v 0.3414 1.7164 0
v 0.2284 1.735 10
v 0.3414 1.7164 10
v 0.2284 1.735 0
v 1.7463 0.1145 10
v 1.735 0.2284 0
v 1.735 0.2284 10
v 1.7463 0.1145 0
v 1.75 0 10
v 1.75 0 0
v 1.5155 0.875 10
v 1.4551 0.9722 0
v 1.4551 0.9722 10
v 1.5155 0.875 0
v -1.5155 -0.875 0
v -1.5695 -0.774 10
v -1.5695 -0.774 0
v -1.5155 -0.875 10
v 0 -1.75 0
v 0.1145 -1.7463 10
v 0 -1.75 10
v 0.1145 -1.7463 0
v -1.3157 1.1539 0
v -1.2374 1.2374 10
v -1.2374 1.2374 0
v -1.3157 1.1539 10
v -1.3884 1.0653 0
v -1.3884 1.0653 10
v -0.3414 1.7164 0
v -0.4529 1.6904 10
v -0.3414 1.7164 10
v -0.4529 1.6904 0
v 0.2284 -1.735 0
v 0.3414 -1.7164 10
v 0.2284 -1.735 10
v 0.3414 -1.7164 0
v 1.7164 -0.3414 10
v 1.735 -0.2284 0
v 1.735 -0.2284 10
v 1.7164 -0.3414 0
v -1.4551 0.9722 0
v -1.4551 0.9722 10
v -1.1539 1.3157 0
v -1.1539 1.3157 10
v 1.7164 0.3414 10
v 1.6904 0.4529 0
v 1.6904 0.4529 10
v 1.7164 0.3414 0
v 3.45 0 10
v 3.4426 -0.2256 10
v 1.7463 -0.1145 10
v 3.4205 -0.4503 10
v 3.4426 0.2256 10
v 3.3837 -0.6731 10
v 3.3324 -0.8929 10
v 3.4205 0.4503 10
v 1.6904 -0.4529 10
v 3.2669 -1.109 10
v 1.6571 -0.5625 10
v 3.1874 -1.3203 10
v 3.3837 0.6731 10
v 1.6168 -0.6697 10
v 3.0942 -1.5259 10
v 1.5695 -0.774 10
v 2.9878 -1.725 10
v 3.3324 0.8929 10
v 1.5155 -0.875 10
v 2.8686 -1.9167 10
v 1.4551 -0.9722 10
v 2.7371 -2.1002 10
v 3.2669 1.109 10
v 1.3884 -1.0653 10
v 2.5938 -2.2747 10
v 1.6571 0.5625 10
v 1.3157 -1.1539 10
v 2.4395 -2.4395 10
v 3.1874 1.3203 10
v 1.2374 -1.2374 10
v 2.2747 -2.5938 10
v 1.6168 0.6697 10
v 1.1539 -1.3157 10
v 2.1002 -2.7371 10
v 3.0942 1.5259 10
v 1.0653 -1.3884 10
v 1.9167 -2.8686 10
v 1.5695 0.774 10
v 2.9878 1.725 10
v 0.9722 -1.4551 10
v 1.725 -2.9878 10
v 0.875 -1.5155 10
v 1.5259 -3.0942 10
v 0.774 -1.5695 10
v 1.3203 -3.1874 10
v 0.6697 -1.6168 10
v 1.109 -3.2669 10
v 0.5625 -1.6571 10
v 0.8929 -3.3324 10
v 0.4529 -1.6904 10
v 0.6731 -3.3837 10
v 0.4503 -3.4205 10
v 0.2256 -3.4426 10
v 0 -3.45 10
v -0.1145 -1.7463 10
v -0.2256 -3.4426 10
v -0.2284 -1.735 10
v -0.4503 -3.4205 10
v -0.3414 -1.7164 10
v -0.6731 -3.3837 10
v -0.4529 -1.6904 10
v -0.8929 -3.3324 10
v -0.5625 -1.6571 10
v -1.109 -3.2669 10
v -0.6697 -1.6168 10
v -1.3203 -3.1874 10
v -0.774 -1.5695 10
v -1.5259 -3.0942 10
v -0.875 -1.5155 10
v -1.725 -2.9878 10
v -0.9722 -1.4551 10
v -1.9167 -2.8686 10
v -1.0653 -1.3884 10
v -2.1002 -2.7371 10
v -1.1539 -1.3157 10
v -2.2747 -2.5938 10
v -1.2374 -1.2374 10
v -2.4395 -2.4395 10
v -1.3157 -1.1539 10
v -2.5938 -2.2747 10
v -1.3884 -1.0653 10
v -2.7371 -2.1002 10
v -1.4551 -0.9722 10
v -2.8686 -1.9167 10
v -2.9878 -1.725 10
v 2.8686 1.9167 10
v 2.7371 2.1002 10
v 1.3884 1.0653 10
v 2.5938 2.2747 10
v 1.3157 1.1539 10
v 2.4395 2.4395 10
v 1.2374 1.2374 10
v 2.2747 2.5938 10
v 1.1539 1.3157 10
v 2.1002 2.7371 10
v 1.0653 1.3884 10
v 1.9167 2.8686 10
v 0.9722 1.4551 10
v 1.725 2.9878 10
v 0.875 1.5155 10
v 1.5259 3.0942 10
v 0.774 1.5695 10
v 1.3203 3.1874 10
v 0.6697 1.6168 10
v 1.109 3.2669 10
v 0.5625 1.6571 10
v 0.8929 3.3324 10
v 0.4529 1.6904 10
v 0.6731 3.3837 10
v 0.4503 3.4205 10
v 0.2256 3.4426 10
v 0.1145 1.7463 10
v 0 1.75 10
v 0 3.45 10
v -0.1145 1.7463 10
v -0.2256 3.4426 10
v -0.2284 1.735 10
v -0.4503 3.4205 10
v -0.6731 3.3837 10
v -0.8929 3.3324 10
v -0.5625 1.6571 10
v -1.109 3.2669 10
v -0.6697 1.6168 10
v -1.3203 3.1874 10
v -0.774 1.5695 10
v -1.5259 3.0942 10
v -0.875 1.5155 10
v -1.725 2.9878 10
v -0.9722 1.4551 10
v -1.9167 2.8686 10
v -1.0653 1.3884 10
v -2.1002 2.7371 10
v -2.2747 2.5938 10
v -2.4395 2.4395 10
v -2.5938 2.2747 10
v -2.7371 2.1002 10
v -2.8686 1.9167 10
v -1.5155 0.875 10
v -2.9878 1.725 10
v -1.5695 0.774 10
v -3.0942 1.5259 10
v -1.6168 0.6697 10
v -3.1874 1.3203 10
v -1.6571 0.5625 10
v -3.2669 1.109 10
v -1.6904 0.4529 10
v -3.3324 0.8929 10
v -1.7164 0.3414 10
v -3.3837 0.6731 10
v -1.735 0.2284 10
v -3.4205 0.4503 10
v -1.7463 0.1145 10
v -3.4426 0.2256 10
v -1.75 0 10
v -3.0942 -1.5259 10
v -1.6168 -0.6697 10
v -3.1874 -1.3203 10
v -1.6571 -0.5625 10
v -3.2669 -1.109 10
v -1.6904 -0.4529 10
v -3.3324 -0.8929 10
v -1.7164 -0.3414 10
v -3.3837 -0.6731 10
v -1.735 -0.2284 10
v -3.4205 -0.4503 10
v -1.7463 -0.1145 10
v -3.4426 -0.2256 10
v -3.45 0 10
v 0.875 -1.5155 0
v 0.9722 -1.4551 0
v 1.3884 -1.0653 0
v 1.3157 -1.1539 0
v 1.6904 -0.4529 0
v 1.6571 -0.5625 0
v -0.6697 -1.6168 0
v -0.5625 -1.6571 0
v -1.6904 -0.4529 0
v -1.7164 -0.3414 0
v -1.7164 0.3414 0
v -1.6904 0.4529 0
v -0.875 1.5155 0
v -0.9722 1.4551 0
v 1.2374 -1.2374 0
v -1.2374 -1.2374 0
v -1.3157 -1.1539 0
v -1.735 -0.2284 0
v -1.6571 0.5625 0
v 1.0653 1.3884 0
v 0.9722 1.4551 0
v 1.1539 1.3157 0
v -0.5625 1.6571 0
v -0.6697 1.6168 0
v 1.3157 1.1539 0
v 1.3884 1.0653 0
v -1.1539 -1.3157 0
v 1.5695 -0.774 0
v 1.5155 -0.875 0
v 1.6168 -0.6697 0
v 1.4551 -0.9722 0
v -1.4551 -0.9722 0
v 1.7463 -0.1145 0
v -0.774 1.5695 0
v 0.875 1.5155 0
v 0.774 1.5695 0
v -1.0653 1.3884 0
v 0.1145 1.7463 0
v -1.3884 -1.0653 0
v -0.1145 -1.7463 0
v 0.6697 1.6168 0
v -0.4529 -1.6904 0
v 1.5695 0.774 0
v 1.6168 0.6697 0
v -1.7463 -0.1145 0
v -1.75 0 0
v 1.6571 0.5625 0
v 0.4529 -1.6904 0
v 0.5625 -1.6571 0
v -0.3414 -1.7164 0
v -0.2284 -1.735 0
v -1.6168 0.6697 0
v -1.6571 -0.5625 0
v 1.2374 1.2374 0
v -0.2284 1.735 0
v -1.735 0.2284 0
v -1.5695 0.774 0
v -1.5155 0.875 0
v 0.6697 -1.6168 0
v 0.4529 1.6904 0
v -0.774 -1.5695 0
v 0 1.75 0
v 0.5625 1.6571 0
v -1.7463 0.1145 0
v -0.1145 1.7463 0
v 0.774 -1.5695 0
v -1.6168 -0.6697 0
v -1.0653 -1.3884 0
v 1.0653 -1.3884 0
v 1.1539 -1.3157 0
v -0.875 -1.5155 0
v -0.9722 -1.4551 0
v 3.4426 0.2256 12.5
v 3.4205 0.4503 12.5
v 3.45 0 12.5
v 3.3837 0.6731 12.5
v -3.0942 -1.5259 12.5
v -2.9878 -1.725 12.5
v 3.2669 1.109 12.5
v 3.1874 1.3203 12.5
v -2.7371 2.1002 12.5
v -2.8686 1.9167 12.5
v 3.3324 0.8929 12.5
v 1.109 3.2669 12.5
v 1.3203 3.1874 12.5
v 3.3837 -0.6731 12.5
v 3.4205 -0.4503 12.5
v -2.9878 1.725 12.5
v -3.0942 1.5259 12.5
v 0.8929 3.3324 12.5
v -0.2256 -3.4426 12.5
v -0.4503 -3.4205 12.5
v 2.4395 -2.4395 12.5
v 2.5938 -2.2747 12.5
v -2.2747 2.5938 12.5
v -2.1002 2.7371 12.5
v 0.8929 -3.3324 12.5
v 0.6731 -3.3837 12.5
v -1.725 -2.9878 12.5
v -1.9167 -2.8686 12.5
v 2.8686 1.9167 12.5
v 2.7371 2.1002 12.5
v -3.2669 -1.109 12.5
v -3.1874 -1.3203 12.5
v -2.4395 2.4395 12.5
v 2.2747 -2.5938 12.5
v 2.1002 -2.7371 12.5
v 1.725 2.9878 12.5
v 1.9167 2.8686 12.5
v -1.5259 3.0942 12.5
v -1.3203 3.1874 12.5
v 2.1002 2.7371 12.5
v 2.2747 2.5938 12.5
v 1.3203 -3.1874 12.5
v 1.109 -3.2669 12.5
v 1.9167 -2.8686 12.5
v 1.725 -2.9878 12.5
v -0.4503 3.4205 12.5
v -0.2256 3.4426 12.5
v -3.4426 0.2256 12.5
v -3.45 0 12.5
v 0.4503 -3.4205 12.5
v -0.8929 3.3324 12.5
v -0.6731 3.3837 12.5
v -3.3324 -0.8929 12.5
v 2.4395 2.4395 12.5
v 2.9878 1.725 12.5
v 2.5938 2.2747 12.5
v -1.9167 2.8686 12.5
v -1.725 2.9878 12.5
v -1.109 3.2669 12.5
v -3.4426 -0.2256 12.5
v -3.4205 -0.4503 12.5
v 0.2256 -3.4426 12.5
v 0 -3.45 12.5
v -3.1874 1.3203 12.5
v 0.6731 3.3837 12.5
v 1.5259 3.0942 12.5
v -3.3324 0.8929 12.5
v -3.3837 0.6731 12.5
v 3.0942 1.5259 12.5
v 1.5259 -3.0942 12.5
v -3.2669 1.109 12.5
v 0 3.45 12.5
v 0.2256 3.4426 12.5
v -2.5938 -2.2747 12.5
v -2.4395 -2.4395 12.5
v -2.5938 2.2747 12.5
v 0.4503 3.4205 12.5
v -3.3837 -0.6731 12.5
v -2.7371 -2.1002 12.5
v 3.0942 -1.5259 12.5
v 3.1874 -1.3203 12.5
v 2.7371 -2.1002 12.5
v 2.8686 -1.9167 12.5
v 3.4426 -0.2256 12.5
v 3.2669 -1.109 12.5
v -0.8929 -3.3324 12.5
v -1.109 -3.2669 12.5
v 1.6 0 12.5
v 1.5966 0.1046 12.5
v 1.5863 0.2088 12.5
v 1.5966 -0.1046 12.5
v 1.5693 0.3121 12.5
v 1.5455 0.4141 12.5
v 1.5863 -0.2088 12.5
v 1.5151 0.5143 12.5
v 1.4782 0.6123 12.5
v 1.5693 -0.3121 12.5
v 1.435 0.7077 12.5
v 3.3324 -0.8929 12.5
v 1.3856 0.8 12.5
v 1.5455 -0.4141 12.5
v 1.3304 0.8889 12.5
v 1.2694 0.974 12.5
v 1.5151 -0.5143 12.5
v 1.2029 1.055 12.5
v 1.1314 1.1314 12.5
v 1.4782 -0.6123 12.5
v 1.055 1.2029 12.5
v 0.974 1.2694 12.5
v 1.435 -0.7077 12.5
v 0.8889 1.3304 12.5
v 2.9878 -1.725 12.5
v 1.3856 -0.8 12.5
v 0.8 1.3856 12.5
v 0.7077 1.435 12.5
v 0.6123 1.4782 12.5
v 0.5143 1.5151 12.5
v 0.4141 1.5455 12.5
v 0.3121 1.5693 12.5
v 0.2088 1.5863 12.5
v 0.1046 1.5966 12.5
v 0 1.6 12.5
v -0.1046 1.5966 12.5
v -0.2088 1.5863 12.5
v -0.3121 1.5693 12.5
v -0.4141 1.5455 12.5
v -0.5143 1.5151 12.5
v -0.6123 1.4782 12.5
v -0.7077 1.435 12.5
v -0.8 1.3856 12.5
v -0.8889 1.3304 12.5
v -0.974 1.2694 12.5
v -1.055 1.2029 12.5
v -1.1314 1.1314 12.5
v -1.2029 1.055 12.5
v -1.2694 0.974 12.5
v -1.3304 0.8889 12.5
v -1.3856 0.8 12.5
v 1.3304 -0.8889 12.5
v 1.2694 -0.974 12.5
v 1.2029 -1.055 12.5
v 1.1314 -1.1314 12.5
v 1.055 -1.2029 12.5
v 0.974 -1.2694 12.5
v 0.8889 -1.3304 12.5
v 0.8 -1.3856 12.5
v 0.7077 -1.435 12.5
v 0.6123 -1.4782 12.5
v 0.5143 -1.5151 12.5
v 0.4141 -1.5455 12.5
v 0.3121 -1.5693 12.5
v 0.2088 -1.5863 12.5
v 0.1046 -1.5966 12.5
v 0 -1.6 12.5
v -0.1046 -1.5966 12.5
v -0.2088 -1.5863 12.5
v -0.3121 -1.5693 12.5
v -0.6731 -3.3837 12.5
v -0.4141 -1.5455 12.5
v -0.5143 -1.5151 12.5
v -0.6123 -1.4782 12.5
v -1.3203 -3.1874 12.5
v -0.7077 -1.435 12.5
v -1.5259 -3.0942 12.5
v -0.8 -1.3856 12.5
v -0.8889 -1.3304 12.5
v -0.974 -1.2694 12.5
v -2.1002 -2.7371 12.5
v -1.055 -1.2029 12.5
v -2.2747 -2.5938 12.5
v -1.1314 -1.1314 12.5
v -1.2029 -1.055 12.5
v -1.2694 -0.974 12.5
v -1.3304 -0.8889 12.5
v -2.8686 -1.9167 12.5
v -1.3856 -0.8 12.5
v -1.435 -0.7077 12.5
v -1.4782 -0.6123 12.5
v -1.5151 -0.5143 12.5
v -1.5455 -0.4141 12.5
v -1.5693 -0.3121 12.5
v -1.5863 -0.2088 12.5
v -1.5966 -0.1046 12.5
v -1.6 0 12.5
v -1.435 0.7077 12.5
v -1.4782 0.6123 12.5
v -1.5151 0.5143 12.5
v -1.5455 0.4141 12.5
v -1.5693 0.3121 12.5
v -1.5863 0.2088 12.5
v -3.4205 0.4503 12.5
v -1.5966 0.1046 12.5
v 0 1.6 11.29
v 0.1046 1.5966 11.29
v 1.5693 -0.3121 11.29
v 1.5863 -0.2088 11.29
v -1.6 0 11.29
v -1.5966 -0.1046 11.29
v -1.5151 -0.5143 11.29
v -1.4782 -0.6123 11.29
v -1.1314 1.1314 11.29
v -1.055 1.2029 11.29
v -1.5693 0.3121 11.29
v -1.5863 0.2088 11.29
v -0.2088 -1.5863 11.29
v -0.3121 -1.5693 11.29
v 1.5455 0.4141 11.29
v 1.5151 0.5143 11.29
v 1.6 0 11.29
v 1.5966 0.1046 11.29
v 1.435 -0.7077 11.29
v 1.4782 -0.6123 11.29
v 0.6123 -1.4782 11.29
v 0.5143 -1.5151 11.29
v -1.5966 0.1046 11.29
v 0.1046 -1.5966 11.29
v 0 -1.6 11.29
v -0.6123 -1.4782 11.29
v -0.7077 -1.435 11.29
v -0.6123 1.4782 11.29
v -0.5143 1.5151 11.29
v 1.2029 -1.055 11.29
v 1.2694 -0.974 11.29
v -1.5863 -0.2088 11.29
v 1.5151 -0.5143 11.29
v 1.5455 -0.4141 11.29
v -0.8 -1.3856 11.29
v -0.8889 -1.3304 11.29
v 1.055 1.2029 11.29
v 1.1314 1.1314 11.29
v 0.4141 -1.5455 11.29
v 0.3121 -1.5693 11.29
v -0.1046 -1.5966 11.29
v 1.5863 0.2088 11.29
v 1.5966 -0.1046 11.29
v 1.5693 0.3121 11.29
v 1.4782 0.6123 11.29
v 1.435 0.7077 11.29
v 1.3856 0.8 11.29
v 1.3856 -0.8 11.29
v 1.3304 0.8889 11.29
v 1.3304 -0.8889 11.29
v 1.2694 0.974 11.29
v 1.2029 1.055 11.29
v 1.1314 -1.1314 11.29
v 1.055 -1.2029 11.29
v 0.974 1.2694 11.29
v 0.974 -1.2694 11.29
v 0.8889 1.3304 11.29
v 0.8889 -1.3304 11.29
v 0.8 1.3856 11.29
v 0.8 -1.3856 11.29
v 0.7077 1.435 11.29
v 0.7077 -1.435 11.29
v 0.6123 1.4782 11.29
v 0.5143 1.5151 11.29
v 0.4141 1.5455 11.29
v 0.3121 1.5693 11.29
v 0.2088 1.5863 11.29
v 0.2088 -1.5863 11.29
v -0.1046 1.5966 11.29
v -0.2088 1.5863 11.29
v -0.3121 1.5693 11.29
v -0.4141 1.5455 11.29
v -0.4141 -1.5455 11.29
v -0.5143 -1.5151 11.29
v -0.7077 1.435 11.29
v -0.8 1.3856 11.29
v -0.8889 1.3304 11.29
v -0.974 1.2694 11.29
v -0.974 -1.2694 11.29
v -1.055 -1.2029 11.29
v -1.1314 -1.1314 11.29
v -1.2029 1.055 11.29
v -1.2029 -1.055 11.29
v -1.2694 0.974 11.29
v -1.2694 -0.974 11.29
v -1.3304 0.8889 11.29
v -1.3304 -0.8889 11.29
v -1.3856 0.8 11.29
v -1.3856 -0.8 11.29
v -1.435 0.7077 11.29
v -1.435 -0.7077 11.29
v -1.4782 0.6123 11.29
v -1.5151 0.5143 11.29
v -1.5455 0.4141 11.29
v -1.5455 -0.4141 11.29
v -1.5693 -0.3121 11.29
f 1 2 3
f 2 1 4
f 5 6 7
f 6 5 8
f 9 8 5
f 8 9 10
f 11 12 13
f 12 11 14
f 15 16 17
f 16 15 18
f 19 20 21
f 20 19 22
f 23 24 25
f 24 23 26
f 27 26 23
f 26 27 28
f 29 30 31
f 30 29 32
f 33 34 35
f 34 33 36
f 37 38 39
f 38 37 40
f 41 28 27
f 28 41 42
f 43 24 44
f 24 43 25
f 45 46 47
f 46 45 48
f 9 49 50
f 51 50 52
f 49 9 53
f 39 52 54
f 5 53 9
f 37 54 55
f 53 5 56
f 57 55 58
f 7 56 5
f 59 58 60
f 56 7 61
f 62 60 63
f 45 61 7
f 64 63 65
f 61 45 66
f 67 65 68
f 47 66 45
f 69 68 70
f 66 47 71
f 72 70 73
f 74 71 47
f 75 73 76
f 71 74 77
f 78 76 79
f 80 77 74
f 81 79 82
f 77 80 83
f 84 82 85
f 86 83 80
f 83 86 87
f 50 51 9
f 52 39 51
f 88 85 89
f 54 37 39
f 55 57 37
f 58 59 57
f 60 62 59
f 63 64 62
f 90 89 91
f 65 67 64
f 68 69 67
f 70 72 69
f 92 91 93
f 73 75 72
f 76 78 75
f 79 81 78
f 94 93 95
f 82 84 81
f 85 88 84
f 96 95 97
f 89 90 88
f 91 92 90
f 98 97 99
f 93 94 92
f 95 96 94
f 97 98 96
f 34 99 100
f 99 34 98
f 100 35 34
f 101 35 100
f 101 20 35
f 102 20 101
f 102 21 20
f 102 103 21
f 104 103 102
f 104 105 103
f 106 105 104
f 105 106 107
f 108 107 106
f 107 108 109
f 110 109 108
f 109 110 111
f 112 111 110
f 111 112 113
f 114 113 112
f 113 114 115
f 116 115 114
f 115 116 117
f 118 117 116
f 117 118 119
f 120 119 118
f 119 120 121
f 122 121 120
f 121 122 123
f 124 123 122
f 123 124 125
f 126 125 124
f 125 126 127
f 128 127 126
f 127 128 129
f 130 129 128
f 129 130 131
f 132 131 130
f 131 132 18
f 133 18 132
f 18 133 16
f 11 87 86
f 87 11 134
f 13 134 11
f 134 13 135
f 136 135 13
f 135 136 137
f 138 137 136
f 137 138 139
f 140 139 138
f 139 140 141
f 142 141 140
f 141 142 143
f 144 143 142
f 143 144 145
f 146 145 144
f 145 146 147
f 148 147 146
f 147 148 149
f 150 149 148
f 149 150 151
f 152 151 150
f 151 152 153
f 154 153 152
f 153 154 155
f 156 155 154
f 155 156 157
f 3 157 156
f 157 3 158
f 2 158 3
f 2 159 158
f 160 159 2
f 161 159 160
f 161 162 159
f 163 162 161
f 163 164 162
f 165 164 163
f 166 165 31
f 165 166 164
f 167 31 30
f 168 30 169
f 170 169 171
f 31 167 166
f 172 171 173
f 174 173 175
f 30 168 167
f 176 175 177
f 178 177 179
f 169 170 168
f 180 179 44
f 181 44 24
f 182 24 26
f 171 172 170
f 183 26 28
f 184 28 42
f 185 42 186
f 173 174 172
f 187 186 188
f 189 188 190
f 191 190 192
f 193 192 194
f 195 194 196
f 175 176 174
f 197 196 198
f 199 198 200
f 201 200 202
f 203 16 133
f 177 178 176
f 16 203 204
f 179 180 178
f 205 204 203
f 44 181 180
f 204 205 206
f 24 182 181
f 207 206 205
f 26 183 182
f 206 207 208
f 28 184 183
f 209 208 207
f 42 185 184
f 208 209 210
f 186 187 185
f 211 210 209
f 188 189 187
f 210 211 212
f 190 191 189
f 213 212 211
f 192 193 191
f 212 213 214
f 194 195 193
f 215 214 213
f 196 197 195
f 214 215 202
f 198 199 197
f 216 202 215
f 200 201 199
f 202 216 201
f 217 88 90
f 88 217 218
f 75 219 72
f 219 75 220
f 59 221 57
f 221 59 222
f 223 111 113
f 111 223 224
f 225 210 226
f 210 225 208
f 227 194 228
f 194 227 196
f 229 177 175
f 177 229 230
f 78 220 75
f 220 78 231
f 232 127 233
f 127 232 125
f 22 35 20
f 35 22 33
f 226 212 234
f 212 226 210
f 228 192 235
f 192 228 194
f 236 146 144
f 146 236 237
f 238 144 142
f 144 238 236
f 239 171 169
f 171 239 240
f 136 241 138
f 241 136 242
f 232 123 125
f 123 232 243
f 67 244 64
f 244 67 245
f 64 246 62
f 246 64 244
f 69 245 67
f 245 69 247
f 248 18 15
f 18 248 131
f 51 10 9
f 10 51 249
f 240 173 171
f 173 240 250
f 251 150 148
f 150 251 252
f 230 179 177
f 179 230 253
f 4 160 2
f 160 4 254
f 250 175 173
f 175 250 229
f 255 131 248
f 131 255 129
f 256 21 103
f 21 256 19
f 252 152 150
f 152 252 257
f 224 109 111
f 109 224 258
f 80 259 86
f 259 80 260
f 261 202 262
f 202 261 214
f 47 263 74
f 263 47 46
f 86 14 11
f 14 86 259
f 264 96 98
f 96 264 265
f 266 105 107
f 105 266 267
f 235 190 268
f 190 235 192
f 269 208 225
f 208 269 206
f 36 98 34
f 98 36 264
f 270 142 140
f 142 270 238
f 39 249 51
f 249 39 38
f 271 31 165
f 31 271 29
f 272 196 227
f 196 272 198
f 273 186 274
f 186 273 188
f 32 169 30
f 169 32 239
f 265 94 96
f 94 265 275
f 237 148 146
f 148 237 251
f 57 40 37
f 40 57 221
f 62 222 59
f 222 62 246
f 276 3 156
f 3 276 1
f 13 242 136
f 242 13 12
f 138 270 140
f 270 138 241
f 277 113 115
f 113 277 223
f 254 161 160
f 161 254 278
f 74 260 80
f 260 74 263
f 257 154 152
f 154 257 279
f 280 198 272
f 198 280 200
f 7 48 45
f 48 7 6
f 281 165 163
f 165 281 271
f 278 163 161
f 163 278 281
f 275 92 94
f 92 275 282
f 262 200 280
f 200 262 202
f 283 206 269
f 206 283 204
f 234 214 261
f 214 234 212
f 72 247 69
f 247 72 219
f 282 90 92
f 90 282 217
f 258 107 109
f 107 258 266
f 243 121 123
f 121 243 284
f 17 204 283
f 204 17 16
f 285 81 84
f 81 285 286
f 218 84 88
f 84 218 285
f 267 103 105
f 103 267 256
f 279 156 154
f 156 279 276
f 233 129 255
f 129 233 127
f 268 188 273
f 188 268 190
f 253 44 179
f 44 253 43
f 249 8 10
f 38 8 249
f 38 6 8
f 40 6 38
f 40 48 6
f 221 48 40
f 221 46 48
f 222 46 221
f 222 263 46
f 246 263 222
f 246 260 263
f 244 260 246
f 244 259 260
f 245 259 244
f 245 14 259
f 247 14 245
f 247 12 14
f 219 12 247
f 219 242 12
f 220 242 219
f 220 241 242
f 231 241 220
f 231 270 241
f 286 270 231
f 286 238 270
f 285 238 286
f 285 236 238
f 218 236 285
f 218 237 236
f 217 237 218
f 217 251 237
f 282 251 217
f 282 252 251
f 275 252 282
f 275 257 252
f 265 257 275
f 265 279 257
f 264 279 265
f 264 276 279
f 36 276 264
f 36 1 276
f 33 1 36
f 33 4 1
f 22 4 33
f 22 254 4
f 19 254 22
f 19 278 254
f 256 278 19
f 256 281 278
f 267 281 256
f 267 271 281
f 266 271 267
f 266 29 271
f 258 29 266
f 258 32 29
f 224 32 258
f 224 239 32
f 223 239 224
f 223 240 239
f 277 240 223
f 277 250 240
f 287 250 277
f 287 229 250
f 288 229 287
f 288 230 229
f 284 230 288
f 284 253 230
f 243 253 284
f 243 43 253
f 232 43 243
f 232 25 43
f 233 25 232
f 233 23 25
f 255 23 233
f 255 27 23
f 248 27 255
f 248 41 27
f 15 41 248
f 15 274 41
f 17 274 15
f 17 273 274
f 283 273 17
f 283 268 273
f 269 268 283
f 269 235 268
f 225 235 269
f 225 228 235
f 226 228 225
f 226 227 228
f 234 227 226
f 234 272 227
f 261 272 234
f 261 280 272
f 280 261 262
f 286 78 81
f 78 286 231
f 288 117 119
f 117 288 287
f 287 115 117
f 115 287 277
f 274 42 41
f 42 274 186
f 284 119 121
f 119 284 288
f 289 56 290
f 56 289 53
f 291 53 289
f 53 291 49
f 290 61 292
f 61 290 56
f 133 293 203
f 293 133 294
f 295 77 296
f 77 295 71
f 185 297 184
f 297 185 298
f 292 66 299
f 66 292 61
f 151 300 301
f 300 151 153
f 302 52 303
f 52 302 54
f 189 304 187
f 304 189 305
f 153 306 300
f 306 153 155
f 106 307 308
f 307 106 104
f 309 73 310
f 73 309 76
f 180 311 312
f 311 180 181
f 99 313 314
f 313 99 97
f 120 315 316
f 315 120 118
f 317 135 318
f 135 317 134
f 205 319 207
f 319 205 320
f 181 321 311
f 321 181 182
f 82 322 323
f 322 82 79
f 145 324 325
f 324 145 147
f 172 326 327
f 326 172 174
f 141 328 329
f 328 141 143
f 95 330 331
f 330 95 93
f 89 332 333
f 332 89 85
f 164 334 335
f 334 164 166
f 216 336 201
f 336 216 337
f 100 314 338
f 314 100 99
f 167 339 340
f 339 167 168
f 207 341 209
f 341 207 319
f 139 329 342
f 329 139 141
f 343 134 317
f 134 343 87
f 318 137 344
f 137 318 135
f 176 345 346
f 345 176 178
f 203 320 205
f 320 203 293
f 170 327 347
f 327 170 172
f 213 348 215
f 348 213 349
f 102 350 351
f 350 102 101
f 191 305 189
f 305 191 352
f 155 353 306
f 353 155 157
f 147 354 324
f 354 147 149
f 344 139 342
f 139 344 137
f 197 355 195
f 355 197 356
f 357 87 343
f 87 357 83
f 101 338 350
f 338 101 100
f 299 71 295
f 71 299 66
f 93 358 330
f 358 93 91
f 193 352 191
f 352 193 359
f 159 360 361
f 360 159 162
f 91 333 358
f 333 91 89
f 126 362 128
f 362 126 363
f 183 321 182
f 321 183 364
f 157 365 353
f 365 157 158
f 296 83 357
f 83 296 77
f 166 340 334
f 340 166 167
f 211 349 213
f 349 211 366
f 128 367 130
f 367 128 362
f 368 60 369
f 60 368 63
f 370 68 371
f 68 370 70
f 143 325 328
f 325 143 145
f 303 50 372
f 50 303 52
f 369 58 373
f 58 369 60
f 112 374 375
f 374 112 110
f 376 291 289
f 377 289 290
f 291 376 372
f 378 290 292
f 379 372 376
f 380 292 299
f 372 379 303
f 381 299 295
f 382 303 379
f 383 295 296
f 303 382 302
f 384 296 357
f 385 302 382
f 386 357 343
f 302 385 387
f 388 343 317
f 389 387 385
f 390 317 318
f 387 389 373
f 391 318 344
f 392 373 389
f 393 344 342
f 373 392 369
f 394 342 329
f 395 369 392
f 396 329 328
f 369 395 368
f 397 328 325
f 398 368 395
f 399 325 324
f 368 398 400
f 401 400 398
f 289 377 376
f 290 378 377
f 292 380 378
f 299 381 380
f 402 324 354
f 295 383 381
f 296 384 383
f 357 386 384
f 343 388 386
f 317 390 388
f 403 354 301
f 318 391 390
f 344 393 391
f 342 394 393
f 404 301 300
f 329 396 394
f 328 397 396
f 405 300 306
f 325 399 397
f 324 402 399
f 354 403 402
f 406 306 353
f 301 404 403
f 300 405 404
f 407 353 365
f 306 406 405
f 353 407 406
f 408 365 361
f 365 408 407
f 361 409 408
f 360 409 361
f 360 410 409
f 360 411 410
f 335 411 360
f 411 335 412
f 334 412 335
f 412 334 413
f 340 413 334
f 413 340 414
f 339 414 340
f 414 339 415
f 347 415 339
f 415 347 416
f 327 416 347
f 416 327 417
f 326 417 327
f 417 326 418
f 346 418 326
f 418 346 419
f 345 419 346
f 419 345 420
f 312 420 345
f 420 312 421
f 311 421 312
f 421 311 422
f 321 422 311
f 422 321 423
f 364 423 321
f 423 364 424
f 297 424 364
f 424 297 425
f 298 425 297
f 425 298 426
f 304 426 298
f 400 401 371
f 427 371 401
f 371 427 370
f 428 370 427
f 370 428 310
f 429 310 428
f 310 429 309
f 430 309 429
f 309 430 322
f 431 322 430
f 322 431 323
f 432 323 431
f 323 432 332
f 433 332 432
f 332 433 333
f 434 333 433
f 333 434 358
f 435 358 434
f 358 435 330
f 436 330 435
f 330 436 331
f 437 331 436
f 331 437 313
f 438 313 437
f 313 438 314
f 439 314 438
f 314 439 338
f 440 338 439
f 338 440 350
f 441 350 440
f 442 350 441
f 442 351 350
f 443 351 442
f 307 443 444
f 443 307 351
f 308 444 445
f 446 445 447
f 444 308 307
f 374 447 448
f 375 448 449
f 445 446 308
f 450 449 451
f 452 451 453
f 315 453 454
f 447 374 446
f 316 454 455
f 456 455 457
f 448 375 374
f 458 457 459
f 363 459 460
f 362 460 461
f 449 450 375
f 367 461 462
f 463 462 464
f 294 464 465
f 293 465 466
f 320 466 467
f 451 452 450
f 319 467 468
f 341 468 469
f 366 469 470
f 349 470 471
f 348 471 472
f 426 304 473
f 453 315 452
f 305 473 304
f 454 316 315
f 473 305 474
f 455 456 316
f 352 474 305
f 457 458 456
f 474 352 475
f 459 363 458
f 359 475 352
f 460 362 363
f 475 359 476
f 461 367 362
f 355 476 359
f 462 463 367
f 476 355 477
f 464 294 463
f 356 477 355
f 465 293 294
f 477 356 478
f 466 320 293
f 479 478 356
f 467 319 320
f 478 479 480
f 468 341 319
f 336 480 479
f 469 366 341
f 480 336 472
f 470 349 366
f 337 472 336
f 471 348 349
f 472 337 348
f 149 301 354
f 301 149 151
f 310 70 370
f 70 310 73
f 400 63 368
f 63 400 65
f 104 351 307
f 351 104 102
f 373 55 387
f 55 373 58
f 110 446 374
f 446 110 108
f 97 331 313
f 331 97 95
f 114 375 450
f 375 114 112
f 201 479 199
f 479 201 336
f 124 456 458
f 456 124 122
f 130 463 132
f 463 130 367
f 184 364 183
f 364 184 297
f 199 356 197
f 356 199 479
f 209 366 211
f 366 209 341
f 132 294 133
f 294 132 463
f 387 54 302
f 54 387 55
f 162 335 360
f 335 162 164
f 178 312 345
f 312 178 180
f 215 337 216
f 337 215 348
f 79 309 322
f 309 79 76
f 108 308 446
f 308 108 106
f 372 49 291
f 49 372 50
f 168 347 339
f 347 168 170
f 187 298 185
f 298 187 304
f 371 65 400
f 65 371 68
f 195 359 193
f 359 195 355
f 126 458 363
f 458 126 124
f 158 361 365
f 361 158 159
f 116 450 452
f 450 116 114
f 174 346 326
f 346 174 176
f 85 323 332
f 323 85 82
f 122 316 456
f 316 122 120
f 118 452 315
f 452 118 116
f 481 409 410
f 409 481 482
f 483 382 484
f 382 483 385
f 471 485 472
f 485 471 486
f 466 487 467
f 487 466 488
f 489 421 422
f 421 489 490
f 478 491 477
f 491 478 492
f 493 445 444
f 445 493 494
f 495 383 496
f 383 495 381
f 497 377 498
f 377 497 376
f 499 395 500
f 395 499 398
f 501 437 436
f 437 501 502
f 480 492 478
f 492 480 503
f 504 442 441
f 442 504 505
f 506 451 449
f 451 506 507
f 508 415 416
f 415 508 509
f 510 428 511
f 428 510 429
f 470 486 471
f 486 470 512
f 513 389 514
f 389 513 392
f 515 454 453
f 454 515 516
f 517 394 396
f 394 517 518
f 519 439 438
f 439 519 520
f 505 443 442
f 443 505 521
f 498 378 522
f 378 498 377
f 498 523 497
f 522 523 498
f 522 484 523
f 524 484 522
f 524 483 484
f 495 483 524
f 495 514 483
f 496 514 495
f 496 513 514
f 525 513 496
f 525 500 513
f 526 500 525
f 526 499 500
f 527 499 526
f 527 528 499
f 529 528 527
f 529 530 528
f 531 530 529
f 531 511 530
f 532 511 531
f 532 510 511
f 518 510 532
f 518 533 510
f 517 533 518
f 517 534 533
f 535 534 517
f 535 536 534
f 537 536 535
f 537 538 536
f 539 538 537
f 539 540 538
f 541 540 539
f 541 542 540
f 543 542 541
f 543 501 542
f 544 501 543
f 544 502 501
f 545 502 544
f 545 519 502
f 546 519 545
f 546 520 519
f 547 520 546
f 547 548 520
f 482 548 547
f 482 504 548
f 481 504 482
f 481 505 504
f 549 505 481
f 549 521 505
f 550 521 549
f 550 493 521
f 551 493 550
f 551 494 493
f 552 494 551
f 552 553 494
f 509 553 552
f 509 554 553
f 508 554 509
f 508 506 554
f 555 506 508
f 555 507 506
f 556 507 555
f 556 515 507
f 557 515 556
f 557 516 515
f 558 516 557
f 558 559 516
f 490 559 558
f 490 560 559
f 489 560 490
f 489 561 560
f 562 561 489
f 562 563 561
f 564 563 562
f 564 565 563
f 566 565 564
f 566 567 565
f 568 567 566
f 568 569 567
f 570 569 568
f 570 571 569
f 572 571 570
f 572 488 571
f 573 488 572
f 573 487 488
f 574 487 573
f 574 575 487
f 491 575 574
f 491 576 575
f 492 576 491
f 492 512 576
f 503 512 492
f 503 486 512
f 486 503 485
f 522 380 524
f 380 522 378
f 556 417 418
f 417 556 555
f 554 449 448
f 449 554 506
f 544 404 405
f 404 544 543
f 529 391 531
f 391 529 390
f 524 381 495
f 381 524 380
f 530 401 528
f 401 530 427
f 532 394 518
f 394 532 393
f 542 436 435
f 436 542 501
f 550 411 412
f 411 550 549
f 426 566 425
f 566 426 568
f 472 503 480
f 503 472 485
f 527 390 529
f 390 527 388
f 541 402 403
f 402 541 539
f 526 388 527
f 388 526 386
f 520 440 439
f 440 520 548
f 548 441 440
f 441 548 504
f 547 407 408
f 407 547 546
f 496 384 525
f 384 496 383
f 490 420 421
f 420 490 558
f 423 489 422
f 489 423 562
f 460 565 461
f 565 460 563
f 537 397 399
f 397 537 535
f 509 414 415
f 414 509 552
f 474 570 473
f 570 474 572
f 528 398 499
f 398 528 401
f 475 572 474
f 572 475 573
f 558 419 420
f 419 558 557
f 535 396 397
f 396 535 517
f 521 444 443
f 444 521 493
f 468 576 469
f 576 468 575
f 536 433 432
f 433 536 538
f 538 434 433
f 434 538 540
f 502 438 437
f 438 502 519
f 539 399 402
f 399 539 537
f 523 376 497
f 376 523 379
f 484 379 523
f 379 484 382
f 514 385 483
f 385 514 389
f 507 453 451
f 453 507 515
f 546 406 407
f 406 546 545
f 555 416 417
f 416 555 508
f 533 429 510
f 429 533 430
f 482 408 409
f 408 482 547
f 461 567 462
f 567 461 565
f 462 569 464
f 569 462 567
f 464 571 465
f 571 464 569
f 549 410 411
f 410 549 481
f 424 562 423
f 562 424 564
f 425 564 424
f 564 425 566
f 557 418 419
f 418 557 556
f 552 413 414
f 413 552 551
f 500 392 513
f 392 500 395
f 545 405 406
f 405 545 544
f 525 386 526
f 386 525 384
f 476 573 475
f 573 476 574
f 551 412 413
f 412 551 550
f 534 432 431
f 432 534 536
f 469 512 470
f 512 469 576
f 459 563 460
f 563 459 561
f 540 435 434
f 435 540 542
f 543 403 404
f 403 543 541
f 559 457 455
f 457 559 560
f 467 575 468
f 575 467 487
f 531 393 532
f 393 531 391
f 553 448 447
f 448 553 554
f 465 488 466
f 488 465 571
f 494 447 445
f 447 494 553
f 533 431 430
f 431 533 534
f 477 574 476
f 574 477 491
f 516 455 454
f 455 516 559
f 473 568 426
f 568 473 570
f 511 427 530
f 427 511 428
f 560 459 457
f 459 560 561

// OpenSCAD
$fn = 96;

// Target dimensions (mm)
shaft_diameter_mm = 3.5;
length_under_head_mm = 10;
head_diameter_mm = 6.9;
head_height_mm = 2.5;

// Simple pan-head shaping + optional recess
under_head_transition_height_mm = 0.8;
head_top_round_mm = 0.6;          // small dome on top of pan head
tip_chamfer_height_mm = 0.8;      // small chamfer at tip

include_drive_recess_cut = 1;     // 0/1
drive_recess_diameter_mm = 3.2;
drive_recess_depth_mm = 1.2;

eps = 0.02;

module pan_head_screw() {
    r_shaft = shaft_diameter_mm/2;
    r_head  = head_diameter_mm/2;

    // Z layout: head sits on top of shaft
    z_head_center = length_under_head_mm + head_height_mm/2;
    z_trans_center = length_under_head_mm + under_head_transition_height_mm/2;
    z_shaft_center = length_under_head_mm/2;

    difference() {
        union() {
            // Shaft (under head length = 10mm)
            translate([0,0,z_shaft_center])
                cylinder(h=length_under_head_mm, r=r_shaft, center=true);

            // Under-head transition (slight flare into head)
            translate([0,0,z_trans_center])
                cylinder(h=under_head_transition_height_mm,
                         r1=r_shaft, r2=r_head, center=true);

            // Pan head main cylinder
            translate([0,0,z_head_center])
                cylinder(h=head_height_mm, r=r_head, center=true);

            // Slight dome on top of head (kept within head diameter)
            translate([0,0,length_under_head_mm + head_height_mm - head_top_round_mm])
                scale([1,1,head_top_round_mm/(r_head)])
                    sphere(r=r_head);

            // Small chamfer at tip (still total under-head length remains 10mm)
            translate([0,0,tip_chamfer_height_mm/2])
                cylinder(h=tip_chamfer_height_mm, r1=0.6*r_shaft, r2=r_shaft, center=true);
        }

        // Drive recess (simple cylindrical recess)
        if (include_drive_recess_cut) {
            z_recess_center = length_under_head_mm + head_height_mm - drive_recess_depth_mm/2;
            translate([0,0,z_recess_center])
                cylinder(h=drive_recess_depth_mm + eps, r=drive_recess_diameter_mm/2, center=true);
        }
    }
}

pan_head_screw();
